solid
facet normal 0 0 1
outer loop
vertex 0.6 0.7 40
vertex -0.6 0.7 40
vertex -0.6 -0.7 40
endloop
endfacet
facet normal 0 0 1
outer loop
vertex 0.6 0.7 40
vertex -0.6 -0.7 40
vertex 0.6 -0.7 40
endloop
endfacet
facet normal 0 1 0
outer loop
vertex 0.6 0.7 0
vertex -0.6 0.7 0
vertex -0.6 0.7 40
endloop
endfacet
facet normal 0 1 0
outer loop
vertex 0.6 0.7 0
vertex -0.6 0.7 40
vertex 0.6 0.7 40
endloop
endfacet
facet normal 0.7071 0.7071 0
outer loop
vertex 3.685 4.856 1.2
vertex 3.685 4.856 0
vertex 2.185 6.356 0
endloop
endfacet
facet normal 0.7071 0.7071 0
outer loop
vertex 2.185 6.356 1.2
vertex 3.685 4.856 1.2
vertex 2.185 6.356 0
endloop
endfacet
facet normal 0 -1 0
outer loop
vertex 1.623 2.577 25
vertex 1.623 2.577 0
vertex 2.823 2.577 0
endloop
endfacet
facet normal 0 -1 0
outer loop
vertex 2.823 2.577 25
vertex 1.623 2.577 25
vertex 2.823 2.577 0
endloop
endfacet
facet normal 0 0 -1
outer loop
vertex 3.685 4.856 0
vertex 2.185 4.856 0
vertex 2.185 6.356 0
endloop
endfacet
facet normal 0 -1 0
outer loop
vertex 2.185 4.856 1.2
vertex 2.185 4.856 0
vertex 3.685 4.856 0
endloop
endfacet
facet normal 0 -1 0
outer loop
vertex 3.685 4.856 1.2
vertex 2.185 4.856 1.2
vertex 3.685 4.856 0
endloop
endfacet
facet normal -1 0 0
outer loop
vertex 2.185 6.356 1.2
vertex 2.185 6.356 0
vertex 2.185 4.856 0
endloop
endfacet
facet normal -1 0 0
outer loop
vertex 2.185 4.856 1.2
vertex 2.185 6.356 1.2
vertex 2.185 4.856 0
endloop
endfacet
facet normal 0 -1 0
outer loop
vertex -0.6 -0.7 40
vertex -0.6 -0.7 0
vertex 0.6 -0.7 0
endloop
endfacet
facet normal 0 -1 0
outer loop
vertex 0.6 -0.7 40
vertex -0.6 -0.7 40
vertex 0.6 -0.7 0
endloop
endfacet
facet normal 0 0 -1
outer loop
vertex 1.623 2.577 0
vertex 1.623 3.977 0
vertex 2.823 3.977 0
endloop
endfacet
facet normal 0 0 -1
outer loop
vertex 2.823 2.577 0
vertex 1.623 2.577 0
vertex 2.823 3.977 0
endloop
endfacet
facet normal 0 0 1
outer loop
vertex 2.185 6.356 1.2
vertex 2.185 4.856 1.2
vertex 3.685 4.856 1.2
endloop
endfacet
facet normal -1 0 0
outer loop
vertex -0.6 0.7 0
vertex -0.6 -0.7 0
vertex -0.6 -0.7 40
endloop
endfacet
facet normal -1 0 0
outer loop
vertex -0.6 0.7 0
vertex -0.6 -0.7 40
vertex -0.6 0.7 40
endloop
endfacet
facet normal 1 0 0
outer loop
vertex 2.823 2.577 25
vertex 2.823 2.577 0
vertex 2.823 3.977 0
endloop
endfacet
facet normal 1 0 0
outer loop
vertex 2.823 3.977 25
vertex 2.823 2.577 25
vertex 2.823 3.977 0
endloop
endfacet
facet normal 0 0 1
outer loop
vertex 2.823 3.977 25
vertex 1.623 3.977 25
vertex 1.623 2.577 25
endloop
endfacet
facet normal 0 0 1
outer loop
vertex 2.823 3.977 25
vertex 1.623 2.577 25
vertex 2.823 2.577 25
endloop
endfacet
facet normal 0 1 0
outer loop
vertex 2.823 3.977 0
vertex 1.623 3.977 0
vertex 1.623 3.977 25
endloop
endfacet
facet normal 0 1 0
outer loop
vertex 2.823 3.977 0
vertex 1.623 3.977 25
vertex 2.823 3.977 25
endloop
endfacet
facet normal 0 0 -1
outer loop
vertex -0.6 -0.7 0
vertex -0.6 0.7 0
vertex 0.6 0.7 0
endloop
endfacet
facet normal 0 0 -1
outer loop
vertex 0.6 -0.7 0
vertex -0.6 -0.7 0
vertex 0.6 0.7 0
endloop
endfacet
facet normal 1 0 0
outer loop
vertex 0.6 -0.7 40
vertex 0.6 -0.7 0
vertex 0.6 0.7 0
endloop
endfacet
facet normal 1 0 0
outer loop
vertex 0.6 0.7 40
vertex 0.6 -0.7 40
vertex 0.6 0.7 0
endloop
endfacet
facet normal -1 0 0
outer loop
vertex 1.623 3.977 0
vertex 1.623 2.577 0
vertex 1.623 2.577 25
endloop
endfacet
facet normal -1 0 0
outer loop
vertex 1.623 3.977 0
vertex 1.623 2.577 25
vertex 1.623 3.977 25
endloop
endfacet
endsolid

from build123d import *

# Parameters (mm, degrees)
F0_W     = 1.2
F0_H     = 1.4
F2_DEPTH = 40
F3_W     = 1.2
F3_H     = 1.4
F4_DEPTH = 25
F6_DEPTH = 1.2


with BuildPart() as f2:
    # F0 (on Top) → F2 (new body)
    with BuildSketch(Plane.XY):
        Rectangle(F0_W, F0_H)
    extrude(amount=F2_DEPTH)


with BuildPart() as f4:
    # F3 (on Top) → F4 (new body)
    with BuildSketch(Plane.XY):
        with Locations((2.223197, 3.277119)):
            Rectangle(F3_W, F3_H)
    extrude(amount=F4_DEPTH)


with BuildPart() as f6:
    # F5 (on Top) → F6 (new body)
    with BuildSketch(Plane.XY):
        Polygon((3.685026, 4.856107), (2.185026, 6.356107), (2.185026, 4.856107), align=None)
    extrude(amount=F6_DEPTH)


solid = Compound([f2.part, f4.part, f6.part])
